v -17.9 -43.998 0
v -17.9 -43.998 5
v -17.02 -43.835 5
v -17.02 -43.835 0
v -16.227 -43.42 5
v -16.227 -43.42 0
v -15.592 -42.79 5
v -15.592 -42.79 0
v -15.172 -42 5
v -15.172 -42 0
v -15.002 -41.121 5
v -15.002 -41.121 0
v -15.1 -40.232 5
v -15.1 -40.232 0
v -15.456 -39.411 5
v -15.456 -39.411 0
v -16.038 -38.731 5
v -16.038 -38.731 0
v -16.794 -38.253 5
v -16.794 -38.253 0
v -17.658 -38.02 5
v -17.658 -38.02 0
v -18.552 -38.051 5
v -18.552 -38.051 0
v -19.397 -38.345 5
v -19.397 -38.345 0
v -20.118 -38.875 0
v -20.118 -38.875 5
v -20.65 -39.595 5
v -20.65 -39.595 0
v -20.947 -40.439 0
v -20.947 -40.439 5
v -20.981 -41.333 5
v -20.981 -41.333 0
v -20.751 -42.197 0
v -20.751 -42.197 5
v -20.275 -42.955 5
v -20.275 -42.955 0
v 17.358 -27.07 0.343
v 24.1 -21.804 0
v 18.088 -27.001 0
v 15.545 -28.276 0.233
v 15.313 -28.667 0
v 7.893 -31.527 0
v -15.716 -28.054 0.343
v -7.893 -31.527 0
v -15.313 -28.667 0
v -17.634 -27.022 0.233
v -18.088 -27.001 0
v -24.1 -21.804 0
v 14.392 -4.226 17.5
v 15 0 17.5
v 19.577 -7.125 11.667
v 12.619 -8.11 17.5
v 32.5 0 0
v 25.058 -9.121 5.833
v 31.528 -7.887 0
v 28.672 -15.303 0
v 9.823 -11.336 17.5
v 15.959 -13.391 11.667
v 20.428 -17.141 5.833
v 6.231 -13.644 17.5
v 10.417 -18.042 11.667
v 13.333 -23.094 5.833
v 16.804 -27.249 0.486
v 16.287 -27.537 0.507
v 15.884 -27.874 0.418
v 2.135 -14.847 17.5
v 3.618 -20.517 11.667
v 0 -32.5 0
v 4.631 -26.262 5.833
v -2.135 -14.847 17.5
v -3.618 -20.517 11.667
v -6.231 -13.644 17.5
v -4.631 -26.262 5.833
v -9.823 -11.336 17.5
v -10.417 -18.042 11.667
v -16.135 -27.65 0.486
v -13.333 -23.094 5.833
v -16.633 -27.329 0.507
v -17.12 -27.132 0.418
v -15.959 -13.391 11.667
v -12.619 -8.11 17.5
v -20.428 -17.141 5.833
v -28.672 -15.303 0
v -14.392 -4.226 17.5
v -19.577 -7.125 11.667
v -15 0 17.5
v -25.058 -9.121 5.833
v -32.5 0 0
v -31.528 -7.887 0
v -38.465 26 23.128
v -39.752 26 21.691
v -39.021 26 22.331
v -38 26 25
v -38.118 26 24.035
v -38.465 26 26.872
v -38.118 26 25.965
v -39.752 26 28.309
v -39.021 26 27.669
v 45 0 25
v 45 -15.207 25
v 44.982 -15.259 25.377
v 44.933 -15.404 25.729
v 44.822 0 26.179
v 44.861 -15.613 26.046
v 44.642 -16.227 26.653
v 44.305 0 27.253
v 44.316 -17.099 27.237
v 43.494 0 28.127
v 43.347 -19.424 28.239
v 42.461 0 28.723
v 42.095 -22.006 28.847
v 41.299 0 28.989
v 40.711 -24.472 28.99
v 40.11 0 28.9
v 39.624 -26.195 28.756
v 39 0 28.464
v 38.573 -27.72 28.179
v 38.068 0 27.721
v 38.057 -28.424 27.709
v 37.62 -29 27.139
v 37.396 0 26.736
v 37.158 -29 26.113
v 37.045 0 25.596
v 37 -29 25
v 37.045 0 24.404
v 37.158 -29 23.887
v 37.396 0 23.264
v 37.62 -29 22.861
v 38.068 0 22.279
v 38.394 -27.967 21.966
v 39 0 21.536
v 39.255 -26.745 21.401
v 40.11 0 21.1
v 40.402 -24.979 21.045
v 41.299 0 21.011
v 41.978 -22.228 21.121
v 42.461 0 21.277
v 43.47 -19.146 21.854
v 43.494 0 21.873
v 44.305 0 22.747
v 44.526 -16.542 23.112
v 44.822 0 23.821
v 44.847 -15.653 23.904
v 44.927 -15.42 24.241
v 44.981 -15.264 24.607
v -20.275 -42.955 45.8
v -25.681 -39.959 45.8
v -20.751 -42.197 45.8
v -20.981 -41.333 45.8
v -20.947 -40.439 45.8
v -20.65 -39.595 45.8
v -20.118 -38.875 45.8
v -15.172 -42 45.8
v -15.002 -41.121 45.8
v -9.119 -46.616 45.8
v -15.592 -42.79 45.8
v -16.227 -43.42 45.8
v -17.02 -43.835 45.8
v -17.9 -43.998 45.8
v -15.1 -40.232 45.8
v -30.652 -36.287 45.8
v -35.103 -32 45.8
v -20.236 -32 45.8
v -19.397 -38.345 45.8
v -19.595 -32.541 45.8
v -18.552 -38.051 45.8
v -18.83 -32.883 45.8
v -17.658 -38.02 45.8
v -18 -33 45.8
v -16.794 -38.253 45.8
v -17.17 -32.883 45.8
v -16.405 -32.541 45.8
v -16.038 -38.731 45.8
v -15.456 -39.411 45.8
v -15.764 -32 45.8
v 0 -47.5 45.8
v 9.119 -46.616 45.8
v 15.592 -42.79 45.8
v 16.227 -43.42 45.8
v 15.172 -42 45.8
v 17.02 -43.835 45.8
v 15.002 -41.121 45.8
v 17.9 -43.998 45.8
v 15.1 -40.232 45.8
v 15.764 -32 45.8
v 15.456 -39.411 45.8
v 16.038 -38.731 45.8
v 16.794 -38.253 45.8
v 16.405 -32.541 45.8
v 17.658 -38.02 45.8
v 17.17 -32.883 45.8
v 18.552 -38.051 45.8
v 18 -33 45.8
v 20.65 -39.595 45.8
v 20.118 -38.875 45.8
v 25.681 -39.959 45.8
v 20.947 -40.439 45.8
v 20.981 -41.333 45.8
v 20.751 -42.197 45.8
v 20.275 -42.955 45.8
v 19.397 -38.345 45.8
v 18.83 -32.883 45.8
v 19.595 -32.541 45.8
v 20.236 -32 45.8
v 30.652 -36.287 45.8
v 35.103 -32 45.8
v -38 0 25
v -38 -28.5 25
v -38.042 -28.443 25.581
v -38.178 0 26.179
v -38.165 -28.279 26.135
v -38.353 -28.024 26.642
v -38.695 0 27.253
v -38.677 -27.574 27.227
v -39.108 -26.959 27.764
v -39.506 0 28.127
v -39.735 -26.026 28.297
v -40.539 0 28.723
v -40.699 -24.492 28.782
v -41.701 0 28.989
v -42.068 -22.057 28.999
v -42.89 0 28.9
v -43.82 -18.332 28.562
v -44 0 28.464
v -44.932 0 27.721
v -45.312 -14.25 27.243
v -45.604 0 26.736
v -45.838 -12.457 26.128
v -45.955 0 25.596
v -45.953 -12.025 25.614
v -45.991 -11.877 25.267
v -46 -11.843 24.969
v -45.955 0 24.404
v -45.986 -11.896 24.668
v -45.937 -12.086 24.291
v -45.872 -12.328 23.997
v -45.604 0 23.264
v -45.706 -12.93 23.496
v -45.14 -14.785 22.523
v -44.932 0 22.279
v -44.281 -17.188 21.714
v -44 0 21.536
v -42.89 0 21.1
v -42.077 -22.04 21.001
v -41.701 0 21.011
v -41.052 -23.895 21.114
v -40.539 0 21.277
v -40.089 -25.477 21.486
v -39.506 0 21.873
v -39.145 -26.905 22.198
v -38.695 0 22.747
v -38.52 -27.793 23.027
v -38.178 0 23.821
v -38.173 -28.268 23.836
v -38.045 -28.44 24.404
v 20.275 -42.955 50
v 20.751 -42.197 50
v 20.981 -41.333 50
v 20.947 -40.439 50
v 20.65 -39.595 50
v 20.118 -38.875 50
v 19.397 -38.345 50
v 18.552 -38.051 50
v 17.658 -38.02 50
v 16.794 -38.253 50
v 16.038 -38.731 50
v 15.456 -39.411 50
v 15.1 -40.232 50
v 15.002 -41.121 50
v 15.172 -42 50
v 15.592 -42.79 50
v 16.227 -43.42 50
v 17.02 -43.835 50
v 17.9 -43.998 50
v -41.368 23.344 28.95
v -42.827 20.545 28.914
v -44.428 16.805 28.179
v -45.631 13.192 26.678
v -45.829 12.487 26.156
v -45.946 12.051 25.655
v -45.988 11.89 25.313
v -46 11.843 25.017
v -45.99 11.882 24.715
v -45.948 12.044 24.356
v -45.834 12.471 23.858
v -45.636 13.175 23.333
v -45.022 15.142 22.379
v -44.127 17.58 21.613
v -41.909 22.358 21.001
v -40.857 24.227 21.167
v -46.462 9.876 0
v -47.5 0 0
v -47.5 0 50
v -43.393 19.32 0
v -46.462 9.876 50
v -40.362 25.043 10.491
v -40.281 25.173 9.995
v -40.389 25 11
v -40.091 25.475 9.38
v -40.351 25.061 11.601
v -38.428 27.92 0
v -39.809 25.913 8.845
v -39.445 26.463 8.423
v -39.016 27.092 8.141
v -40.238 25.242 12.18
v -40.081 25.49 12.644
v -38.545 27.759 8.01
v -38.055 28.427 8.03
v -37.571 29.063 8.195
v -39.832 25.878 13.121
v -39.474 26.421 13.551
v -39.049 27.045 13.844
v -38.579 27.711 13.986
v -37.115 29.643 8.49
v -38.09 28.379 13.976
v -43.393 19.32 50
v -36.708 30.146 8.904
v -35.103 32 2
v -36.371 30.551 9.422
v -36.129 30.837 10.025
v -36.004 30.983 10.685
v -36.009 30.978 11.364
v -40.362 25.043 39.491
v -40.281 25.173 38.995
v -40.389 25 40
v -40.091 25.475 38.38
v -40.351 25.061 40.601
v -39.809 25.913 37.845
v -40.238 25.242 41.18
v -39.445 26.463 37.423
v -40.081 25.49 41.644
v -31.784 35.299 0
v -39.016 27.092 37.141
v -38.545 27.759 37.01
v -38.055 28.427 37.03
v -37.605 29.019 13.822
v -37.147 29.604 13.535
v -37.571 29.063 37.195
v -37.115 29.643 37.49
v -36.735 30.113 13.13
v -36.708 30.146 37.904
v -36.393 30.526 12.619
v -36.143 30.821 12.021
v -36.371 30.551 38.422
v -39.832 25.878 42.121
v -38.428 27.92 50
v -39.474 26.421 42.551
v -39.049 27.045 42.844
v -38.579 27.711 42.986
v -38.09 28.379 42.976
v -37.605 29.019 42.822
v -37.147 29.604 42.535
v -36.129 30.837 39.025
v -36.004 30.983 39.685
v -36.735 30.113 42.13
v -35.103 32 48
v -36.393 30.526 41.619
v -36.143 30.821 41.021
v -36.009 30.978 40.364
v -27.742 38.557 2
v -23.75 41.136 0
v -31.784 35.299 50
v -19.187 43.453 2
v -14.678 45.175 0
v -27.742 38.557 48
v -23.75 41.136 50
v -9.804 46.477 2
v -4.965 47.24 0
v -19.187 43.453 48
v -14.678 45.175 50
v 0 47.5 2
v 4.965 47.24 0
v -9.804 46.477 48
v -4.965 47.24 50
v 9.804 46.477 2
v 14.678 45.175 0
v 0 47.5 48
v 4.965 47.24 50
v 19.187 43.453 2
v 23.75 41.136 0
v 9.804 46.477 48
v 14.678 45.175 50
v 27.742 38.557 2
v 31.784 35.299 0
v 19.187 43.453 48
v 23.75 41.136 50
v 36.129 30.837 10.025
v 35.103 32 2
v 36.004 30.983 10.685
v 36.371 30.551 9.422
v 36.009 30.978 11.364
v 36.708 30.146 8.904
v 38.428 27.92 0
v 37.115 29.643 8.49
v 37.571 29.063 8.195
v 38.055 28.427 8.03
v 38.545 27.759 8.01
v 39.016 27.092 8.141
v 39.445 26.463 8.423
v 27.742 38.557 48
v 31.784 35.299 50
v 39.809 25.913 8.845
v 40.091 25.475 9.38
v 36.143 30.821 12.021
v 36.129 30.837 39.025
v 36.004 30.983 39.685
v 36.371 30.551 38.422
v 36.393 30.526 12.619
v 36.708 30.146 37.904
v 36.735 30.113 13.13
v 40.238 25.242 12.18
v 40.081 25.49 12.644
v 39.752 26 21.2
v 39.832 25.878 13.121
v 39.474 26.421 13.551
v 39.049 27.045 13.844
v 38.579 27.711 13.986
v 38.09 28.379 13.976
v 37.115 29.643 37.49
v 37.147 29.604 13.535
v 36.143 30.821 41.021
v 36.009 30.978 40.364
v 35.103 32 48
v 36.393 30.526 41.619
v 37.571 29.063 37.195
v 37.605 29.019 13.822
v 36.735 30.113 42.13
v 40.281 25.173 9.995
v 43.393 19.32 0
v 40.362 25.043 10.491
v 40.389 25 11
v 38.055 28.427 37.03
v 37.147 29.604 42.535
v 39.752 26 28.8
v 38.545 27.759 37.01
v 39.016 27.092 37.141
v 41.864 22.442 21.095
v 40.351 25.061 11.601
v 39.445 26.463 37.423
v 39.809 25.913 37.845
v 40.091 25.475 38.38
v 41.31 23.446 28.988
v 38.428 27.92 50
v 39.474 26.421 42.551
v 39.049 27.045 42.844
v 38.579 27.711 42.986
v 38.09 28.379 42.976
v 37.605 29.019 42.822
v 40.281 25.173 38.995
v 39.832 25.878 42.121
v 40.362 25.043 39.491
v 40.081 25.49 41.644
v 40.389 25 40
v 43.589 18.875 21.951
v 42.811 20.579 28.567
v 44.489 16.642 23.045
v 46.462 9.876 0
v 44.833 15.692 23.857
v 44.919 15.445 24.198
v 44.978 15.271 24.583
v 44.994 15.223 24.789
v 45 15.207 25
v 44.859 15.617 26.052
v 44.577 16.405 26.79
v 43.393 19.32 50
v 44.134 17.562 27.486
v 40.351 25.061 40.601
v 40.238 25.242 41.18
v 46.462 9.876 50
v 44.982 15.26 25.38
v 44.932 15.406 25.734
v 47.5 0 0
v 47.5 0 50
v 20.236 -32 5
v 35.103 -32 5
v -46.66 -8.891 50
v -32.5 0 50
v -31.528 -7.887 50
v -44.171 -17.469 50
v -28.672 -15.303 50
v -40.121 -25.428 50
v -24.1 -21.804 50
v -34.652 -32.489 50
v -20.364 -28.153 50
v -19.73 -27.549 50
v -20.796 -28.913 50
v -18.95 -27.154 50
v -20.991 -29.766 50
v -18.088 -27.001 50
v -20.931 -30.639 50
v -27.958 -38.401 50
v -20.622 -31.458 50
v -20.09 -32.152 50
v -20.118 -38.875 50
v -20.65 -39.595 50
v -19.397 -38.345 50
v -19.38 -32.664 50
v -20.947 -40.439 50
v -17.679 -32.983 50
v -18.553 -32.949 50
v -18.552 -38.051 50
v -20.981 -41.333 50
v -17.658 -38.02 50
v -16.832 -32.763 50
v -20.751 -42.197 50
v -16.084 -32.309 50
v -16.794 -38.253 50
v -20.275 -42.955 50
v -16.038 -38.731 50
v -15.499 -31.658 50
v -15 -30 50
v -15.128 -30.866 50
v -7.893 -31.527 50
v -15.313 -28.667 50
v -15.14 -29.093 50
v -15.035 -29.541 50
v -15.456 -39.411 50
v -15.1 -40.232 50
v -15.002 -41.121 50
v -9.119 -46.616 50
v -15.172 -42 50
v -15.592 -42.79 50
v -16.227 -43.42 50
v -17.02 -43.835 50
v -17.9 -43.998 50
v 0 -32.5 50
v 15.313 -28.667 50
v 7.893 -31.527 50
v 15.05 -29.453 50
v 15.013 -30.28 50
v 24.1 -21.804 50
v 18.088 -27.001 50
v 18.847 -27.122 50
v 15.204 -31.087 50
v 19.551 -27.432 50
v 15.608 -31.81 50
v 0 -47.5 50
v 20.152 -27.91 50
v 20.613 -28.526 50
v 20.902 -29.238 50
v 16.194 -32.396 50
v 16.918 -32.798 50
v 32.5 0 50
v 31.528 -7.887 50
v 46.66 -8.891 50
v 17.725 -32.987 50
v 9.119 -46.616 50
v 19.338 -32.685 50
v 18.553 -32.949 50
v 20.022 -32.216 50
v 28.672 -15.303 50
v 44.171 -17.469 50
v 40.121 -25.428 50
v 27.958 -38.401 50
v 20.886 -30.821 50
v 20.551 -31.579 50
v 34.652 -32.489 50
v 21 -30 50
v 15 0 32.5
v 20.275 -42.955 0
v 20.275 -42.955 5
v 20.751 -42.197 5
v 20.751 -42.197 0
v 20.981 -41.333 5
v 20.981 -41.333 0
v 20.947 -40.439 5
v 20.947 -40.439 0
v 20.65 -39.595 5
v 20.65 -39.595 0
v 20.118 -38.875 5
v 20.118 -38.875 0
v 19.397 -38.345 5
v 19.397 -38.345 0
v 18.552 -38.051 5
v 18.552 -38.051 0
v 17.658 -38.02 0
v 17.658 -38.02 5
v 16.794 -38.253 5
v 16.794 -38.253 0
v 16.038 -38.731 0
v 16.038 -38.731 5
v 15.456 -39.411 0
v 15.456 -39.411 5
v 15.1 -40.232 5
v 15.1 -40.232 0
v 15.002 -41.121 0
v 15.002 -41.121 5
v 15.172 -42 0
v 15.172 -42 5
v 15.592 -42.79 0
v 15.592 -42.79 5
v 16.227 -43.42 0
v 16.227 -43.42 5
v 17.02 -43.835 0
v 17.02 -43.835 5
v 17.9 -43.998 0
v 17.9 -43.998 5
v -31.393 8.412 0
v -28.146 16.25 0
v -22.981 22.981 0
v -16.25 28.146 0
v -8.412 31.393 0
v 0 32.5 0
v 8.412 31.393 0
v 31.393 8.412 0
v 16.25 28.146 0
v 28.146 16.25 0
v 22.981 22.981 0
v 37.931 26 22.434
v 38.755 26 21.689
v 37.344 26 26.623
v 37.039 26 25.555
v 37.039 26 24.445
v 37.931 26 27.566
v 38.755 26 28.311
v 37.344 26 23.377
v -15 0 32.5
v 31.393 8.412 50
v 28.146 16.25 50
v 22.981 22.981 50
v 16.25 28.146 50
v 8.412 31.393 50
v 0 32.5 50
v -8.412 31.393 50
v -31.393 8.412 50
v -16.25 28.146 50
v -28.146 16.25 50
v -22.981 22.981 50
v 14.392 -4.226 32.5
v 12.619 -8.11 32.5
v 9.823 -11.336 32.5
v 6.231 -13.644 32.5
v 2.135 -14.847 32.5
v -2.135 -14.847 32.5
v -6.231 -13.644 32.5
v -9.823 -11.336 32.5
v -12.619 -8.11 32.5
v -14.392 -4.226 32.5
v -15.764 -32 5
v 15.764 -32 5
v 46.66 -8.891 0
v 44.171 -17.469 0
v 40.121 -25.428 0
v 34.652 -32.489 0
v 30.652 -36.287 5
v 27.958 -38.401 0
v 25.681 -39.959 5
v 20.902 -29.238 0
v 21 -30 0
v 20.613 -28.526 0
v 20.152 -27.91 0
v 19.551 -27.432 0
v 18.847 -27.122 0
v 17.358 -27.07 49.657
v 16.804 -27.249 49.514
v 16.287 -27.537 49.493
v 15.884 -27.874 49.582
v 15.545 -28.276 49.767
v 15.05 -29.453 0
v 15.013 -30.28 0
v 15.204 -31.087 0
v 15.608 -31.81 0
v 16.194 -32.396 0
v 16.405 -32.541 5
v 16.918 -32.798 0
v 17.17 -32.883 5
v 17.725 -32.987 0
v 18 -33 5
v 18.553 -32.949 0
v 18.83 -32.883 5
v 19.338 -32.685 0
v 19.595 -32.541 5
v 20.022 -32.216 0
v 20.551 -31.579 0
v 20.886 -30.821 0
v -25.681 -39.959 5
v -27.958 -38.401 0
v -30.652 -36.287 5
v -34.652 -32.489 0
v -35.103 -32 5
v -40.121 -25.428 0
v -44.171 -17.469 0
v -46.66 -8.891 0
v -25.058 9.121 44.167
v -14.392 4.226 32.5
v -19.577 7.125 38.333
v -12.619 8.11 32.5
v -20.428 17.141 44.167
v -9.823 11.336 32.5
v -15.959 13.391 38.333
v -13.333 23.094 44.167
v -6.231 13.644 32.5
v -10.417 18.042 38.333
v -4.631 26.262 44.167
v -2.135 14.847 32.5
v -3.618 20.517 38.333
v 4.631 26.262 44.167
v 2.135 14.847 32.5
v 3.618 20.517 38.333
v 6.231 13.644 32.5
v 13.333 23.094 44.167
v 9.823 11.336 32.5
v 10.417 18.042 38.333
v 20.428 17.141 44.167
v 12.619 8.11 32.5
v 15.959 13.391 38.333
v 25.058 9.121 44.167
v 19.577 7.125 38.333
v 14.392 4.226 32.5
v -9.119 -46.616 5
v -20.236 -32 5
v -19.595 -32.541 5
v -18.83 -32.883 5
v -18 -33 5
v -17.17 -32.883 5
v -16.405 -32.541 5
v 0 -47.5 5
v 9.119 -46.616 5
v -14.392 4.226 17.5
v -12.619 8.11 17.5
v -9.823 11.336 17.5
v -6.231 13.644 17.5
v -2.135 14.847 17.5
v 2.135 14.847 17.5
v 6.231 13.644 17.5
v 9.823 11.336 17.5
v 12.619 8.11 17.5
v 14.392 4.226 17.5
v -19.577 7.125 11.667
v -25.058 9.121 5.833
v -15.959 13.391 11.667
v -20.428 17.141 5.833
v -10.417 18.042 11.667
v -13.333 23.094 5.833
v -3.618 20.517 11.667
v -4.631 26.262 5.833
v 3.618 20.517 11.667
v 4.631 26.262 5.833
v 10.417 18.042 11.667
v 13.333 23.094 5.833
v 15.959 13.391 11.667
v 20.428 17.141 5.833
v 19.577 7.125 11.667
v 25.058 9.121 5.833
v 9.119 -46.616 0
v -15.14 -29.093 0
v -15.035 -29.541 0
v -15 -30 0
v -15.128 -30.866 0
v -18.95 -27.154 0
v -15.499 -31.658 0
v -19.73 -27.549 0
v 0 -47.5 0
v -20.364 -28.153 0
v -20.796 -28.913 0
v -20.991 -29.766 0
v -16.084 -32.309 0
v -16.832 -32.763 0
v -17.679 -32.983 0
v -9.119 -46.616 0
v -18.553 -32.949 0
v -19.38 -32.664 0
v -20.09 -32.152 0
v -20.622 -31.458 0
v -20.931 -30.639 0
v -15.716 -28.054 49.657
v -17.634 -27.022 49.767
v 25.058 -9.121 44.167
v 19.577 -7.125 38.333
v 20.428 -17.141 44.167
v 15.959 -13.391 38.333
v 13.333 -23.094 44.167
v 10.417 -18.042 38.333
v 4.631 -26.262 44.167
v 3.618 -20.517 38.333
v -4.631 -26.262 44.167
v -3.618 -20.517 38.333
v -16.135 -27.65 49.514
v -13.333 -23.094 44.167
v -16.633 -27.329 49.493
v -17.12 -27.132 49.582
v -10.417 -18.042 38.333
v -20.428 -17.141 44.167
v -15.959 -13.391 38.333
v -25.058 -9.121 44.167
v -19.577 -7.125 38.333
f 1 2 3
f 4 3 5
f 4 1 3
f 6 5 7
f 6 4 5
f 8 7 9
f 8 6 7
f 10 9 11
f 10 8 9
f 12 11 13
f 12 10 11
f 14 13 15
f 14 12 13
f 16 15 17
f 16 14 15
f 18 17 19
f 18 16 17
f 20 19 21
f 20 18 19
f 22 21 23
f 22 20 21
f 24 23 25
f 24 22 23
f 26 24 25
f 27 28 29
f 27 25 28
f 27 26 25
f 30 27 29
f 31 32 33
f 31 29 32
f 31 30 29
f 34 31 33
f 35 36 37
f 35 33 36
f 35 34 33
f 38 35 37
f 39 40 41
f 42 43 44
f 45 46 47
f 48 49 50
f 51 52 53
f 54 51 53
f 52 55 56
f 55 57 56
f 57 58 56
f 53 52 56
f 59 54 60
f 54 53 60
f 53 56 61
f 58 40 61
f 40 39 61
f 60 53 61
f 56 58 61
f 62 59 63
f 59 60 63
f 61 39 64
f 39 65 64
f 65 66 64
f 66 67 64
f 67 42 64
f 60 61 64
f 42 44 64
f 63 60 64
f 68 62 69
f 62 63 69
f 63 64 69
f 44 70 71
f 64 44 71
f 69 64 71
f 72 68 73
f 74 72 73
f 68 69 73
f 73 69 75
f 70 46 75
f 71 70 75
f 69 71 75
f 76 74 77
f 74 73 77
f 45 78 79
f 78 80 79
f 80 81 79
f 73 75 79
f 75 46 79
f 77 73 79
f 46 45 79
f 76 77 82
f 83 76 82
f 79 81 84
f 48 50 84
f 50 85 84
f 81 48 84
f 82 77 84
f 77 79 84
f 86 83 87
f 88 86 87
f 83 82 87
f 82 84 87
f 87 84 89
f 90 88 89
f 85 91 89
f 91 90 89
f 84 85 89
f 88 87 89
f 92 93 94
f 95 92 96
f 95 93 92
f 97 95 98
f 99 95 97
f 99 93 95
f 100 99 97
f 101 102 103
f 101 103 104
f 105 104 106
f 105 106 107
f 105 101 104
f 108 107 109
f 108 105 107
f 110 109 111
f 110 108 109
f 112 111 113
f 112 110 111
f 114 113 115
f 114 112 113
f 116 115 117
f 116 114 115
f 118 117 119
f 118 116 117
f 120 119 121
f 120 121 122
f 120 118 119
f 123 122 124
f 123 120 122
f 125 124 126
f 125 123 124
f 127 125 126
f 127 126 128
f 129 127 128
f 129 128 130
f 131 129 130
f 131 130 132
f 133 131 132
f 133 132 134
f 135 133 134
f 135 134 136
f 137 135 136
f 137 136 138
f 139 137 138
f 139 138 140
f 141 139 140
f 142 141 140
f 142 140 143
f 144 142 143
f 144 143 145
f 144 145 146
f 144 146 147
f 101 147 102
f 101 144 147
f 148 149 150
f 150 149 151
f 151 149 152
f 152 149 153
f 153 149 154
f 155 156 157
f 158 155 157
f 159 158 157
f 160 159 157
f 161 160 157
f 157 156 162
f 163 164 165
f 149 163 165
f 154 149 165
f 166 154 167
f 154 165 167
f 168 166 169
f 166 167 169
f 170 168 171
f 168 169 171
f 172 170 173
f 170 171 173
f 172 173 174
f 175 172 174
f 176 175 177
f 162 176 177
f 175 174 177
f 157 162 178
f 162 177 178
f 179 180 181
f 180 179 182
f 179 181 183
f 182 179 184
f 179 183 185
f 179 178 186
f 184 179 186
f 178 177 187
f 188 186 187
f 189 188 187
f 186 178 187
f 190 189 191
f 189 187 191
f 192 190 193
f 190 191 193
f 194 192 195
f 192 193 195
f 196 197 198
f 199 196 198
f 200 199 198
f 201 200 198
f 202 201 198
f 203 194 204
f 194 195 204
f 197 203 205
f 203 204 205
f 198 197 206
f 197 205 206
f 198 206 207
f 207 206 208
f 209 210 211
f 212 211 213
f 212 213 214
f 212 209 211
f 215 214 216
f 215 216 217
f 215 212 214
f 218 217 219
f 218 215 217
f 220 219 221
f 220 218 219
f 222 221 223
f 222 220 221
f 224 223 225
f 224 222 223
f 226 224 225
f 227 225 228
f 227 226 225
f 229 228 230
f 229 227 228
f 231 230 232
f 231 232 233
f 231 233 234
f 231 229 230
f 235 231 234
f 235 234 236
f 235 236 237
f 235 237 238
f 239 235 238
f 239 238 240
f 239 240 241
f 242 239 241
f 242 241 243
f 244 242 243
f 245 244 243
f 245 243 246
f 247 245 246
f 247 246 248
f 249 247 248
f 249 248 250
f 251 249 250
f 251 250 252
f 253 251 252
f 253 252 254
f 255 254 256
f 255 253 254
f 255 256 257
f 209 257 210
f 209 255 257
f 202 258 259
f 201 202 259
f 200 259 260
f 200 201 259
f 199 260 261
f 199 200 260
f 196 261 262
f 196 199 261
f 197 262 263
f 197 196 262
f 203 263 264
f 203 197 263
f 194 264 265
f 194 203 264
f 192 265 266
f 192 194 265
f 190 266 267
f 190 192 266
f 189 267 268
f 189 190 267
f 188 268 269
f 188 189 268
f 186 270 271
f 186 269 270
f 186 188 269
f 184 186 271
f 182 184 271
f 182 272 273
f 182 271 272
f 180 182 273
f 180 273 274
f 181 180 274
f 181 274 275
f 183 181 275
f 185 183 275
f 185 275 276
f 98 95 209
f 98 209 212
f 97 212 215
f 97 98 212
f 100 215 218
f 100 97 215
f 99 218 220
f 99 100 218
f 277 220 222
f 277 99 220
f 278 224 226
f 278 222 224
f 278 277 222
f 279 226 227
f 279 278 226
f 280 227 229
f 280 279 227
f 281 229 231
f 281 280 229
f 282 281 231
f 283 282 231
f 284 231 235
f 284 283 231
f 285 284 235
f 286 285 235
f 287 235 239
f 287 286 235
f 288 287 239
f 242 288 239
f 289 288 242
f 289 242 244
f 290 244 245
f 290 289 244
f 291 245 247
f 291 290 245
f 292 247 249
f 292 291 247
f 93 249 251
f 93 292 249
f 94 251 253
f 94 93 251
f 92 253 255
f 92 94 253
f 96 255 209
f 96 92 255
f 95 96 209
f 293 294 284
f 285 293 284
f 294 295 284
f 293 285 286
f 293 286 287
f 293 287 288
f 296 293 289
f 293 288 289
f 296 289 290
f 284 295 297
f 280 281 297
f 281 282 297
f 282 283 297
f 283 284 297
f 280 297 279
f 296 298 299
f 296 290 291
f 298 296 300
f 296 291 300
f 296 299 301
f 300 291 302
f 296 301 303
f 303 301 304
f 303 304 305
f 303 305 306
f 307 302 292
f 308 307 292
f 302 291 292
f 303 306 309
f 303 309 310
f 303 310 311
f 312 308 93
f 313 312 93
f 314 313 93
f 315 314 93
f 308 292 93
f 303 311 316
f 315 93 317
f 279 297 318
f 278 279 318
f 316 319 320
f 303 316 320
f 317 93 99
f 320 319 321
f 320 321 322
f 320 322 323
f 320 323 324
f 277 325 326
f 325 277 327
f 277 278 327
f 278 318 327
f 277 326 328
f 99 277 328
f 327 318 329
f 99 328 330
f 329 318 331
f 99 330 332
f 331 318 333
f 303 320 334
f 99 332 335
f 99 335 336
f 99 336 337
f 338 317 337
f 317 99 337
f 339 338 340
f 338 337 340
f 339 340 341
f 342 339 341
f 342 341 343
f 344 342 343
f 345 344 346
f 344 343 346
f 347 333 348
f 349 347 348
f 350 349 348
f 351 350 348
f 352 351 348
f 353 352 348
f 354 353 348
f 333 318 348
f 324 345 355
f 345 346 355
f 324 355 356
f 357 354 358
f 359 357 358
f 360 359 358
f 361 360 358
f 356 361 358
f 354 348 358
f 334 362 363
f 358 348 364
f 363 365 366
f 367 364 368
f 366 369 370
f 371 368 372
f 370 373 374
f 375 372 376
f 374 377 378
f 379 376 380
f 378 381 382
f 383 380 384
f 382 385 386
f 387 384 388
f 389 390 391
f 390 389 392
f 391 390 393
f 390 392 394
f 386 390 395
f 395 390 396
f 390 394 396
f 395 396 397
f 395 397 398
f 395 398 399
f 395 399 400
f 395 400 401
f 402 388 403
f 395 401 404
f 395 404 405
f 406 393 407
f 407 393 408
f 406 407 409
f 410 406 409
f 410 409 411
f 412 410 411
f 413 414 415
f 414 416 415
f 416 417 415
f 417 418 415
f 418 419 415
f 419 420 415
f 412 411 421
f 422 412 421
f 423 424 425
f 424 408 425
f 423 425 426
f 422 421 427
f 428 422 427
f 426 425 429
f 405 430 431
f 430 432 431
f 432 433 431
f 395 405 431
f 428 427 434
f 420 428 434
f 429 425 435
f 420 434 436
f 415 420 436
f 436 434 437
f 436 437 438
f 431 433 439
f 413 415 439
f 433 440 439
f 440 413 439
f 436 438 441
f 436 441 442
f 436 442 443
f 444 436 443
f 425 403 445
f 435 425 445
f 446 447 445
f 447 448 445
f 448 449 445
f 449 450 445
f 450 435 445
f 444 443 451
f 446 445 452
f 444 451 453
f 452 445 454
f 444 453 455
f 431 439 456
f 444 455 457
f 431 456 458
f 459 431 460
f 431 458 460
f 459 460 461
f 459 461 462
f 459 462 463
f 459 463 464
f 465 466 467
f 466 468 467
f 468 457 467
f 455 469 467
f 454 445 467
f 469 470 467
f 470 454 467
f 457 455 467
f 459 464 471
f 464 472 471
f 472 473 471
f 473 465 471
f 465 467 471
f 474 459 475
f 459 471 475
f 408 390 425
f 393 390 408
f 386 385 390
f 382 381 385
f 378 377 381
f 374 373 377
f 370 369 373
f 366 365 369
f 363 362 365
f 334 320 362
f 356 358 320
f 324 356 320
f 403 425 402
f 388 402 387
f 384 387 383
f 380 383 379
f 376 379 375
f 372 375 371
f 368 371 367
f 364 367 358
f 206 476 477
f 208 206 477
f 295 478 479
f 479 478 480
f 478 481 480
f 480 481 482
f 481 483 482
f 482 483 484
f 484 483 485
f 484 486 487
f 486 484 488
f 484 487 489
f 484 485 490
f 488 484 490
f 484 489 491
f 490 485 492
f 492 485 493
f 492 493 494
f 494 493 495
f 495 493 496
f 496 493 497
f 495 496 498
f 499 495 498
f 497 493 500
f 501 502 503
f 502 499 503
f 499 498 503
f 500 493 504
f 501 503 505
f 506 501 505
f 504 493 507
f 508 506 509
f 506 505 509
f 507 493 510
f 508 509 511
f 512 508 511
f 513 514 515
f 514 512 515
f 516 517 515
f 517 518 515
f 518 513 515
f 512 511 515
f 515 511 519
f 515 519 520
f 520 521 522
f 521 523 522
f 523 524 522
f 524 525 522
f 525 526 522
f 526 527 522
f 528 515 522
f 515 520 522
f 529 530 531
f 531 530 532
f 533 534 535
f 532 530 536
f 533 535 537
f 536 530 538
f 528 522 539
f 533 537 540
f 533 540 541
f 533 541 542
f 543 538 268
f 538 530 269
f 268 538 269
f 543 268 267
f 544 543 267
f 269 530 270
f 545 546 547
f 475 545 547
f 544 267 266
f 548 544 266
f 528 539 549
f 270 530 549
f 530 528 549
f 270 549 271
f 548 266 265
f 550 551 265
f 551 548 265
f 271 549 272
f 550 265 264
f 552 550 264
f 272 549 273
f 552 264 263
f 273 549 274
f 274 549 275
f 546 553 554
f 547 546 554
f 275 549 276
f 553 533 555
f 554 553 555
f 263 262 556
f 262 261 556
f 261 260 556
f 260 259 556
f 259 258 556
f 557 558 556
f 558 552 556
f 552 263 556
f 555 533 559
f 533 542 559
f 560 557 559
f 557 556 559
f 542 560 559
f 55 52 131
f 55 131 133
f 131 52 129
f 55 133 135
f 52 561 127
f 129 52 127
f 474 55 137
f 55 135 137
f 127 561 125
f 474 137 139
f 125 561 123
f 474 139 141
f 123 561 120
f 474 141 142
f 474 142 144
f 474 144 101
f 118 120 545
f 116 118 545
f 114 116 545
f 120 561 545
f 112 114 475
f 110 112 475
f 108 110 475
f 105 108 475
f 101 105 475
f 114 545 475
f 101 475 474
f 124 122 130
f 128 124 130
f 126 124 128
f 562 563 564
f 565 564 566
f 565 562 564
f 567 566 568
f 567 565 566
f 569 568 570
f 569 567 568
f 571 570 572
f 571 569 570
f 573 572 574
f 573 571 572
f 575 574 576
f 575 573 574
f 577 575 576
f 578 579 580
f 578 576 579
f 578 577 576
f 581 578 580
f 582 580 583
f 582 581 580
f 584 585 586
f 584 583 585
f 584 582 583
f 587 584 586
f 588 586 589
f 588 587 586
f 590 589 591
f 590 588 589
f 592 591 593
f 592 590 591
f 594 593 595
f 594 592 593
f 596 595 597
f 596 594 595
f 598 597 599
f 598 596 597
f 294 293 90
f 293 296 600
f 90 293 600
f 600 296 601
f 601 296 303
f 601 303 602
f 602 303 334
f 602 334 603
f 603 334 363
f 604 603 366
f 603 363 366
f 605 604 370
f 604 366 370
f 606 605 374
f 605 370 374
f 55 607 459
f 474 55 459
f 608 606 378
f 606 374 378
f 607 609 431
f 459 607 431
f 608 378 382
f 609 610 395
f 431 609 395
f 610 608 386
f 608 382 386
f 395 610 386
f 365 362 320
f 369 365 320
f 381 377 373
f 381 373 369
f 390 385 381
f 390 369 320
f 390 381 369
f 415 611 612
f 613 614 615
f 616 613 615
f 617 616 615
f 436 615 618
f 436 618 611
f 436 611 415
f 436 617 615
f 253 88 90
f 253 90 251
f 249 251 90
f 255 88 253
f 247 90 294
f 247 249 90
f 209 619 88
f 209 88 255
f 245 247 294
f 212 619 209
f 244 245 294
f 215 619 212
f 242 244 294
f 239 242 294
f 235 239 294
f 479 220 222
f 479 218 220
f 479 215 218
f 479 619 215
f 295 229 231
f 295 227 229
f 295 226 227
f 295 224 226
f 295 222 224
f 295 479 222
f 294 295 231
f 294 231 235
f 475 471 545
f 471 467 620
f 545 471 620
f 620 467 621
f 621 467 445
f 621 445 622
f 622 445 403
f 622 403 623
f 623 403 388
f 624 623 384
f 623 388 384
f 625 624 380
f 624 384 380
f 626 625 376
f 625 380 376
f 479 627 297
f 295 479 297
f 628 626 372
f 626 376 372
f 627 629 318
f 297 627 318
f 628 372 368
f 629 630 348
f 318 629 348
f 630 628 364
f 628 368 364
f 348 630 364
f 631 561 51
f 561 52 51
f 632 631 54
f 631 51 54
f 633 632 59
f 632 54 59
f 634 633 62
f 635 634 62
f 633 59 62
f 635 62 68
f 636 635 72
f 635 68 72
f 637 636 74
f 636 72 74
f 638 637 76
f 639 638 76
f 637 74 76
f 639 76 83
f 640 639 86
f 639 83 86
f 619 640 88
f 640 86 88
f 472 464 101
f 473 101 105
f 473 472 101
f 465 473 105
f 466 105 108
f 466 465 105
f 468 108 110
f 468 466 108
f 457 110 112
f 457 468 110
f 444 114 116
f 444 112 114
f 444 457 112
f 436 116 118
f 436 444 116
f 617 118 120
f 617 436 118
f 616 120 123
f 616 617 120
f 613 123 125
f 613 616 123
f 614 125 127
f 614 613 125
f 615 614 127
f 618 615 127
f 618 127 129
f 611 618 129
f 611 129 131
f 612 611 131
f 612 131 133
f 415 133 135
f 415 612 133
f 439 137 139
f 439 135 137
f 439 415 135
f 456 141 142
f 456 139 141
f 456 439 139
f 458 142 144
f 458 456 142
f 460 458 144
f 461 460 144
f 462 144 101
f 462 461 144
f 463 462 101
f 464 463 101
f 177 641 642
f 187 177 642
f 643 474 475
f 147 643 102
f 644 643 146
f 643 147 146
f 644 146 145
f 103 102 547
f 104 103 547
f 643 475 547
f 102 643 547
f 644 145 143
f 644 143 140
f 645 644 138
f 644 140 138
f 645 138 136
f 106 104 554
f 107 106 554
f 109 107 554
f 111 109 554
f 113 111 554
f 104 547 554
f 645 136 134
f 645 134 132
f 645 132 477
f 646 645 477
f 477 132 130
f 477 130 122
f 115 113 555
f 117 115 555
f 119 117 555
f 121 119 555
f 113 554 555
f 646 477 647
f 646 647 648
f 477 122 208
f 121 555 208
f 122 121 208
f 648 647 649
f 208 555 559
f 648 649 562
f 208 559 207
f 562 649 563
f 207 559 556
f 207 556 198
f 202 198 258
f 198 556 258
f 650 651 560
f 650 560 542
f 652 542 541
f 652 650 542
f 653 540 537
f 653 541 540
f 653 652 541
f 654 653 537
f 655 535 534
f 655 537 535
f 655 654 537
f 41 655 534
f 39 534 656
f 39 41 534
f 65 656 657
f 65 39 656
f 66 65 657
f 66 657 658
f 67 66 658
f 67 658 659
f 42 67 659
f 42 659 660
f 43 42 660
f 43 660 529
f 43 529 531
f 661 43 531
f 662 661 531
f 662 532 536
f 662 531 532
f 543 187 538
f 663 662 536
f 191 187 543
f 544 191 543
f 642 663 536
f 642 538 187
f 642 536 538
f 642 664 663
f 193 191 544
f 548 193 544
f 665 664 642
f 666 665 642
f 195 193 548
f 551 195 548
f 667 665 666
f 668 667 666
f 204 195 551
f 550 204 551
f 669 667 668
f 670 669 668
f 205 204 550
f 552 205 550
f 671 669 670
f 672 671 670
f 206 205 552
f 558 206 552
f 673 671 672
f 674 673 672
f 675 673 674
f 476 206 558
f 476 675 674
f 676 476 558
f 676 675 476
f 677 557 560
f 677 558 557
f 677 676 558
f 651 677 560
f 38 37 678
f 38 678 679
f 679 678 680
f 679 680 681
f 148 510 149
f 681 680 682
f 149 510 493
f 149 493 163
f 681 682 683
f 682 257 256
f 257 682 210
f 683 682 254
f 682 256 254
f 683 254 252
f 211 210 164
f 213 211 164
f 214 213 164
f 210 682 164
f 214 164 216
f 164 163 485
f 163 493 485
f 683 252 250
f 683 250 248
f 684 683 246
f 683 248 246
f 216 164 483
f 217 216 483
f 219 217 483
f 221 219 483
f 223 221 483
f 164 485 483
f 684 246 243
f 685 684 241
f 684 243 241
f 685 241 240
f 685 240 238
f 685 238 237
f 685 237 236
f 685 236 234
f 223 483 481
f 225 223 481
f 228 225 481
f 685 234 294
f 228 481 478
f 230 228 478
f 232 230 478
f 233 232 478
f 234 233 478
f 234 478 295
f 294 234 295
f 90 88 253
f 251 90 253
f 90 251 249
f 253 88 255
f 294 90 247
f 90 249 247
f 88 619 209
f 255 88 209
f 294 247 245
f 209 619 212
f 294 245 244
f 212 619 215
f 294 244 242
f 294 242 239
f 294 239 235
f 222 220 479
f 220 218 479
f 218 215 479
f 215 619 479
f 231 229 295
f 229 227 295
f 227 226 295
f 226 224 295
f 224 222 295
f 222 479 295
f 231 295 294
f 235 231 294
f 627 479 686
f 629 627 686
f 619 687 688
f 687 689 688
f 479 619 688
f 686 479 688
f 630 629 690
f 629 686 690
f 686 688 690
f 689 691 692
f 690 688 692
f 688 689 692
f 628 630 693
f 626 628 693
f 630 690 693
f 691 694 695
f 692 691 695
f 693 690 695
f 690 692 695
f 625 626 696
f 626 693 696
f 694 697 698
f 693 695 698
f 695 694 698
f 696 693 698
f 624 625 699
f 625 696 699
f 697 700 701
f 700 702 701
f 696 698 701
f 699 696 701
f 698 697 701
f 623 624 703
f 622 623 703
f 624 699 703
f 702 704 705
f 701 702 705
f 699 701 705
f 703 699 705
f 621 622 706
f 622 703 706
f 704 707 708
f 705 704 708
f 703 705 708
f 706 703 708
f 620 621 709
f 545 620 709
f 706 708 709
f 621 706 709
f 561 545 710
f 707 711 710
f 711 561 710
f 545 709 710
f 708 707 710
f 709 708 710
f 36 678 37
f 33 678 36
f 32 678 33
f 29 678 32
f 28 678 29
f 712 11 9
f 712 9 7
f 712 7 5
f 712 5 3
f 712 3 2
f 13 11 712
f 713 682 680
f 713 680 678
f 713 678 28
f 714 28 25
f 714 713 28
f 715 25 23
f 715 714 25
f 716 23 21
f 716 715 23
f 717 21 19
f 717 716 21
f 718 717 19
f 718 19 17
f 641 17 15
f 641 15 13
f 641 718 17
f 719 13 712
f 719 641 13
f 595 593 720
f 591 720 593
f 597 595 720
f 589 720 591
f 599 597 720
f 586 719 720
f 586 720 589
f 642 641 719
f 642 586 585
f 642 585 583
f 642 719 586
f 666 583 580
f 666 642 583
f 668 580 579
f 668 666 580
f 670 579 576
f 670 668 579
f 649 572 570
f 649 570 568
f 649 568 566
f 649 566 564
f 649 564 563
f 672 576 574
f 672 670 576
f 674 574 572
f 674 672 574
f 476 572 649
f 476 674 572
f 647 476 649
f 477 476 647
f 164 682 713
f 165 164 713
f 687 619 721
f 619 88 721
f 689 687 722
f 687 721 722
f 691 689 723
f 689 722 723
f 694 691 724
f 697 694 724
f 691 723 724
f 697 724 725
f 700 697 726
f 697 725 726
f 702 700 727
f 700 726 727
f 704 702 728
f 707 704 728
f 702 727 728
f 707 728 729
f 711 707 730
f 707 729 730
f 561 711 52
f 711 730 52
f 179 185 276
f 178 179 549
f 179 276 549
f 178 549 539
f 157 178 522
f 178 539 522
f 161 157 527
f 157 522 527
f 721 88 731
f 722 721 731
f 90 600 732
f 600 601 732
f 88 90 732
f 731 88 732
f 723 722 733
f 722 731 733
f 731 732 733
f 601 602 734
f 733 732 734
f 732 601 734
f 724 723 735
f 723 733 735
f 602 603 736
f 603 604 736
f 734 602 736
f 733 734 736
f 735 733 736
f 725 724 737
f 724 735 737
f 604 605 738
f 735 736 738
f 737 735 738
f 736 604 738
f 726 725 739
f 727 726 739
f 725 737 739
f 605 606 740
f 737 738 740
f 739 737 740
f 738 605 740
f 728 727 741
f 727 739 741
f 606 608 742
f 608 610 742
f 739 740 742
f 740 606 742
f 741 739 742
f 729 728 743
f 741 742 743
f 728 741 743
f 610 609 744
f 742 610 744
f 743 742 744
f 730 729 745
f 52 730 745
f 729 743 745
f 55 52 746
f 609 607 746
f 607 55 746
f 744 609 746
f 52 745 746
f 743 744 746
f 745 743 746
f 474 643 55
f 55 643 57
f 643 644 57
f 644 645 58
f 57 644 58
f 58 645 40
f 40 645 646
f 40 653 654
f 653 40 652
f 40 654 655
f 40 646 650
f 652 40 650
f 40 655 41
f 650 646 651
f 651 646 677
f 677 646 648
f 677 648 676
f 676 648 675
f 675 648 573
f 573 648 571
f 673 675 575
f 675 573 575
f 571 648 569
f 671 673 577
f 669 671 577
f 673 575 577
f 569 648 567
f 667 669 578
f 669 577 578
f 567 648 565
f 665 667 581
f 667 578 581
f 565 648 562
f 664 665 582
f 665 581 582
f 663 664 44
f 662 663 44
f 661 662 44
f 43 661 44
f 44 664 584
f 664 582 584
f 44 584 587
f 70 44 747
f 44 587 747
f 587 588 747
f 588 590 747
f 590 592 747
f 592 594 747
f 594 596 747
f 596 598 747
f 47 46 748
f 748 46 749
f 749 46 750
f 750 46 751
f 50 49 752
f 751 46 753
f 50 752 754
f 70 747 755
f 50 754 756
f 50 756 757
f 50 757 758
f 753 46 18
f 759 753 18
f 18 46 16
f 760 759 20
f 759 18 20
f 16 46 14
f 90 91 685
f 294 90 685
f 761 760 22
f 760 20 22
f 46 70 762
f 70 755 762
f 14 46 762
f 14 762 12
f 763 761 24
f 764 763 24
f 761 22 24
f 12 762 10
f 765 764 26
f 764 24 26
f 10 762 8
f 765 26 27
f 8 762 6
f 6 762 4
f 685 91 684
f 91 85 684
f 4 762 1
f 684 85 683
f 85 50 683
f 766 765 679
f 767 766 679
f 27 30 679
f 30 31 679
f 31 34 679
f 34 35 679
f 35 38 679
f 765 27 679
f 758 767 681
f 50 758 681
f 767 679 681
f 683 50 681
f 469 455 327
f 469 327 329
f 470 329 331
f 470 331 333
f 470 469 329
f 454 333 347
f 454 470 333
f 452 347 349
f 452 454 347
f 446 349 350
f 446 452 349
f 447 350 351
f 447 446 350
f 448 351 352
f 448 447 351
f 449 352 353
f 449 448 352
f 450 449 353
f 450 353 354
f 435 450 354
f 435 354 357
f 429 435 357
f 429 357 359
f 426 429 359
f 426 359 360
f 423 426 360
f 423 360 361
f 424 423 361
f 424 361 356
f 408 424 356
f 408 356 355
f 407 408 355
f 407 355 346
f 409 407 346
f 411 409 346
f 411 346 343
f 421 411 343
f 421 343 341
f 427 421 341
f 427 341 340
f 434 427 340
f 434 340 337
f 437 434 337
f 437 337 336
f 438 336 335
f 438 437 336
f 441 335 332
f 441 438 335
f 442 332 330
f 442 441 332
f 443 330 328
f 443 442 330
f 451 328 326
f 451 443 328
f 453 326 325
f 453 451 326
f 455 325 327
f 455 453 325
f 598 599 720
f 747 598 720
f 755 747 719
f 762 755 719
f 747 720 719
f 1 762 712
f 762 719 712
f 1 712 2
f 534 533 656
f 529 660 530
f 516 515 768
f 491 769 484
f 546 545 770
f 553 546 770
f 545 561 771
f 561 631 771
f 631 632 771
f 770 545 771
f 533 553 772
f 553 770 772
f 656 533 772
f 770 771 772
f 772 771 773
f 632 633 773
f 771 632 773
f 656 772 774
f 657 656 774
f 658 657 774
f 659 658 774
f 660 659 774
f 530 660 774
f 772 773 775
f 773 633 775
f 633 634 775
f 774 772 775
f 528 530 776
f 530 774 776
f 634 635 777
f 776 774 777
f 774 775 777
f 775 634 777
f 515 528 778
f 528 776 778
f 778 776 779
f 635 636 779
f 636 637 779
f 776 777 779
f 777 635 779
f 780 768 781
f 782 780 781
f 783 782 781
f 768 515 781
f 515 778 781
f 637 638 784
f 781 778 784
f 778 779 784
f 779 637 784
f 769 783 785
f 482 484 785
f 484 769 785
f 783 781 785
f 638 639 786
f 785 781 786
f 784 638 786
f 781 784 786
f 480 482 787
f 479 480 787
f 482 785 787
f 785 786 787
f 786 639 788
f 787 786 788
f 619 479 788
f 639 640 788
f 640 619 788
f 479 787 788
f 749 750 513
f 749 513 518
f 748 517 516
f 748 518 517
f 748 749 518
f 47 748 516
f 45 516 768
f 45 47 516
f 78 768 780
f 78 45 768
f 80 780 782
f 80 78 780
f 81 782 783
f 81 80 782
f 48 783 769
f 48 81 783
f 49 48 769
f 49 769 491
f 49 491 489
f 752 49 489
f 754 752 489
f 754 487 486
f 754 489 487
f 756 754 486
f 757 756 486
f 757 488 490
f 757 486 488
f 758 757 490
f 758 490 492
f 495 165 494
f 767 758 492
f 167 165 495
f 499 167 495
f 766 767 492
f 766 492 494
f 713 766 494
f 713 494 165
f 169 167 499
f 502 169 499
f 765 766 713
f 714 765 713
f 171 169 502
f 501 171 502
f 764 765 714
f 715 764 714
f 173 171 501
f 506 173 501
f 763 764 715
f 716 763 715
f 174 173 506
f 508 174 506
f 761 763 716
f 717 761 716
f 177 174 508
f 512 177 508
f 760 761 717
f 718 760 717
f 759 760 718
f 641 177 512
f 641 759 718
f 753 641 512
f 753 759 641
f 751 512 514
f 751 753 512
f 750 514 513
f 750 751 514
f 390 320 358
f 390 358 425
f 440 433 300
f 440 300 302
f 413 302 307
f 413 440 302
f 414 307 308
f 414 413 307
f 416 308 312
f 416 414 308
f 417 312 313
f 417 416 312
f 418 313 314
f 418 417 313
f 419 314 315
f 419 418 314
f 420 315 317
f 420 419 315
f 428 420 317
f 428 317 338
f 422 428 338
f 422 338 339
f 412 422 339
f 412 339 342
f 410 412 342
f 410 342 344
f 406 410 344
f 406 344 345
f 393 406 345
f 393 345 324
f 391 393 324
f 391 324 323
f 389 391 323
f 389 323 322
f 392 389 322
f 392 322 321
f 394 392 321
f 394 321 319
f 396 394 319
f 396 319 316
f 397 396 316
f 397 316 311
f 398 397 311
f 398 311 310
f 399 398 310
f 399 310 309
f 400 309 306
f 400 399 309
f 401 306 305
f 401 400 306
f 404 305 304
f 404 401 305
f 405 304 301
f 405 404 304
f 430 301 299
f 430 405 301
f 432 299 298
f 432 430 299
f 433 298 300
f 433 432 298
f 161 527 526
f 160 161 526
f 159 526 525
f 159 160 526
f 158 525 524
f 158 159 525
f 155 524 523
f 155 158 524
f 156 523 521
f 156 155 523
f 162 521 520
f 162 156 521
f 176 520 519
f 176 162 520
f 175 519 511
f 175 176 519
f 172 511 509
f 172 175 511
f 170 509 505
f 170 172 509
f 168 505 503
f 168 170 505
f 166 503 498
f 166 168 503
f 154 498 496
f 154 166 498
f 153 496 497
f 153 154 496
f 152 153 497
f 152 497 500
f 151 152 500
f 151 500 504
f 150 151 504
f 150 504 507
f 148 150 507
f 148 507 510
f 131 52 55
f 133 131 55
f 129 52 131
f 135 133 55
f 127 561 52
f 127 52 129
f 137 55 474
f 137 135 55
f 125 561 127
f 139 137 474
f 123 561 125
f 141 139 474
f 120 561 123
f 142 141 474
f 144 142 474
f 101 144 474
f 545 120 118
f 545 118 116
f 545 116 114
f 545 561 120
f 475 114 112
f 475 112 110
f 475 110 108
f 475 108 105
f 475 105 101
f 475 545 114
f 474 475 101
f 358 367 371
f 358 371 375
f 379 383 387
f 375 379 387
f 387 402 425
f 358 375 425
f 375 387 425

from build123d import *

# Parameters (mm, degrees)
CYLINDER002_R          = 4
CYLINDER002_DEPTH      = 55
CYLINDER002_ROLL_ANGLE = 90
CYLINDER005_R          = 4
CYLINDER005_DEPTH      = 55
CYLINDER005_ROLL_ANGLE = 90
CYLINDER003_R          = 3
CYLINDER003_DEPTH      = 100
CYLINDER004_R          = 3
CYLINDER004_DEPTH      = 100
BOX001_W               = 73
BOX001_H               = 40
BOX001_DEPTH           = 46
REVOLUTION_ANGLE       = -180
CLONE_PLACEMENT_ANGLE  = 180
CYLINDER001_R          = 3
CYLINDER001_DEPTH      = 60
CYLINDER_R             = 3
CYLINDER_DEPTH         = 60
BOX_W                  = 73
BOX_H                  = 40
BOX_DEPTH              = 40.8


with BuildPart() as cilindro002:
    # Cylinder002 → Cylinder002 (new body)
    with BuildSketch(Plane.XY):
        Circle(CYLINDER002_R)
    extrude(amount=CYLINDER002_DEPTH)


with BuildPart() as cilindro002_1:
    # Cylinder002 roll: moved
    add(cilindro002.part.rotate(Axis((0, 0, 0), (1, 0, 0)), CYLINDER002_ROLL_ANGLE))


with BuildPart() as cilindro002_2:
    # Cylinder002 placement: moved
    add(cilindro002_1.part.moved(Location((41, 26, 25))))


with BuildPart() as fusion004:
    # Cylinder005 → Cylinder005 (new body)
    with BuildSketch(Plane.XY):
        Circle(CYLINDER005_R)
    extrude(amount=CYLINDER005_DEPTH)


with BuildPart() as fusion004_1:
    # Cylinder005 roll: moved
    add(fusion004.part.rotate(Axis((0, 0, 0), (1, 0, 0)), CYLINDER005_ROLL_ANGLE))


with BuildPart() as fusion004_2:
    # Cylinder005 placement: moved
    add(fusion004_1.part.moved(Location((-42, 26, 25))))

    # Fusion004: union Cilindro002
    add(cilindro002_2.part)


with BuildPart() as cilindro003:
    # Cylinder003 → Cylinder003 (new body)
    with BuildSketch(Plane(origin=(47, 28, 40), x_dir=(0, -1, 0), z_dir=(-1, 0, 0))):
        Circle(CYLINDER003_R)
    extrude(amount=CYLINDER003_DEPTH)


with BuildPart() as fusion003:
    # Cylinder004 → Cylinder004 (new body)
    with BuildSketch(Plane(origin=(47, 28, 11), x_dir=(0, -1, 0), z_dir=(-1, 0, 0))):
        Circle(CYLINDER004_R)
    extrude(amount=CYLINDER004_DEPTH)

    # Fusion003: union Cilindro003
    add(cilindro003.part)


with BuildPart() as cubo001:
    # Box001 → Box001 (new body)
    with BuildSketch(Plane(origin=(-36, 32, 2), x_dir=(1, 0, 0), z_dir=(0, 0, 1))):
        with Locations((36.5, 20)):
            Rectangle(BOX001_W, BOX001_H)
    extrude(amount=BOX001_DEPTH)


with BuildPart() as revolution:
    # Sketch → Revolution (revolve)
    with BuildSketch(Plane.XZ):
        Polygon((32.5, 50), (15, 32.5), (15, 17.5), (32.5, 0), (47.5, 0), (47.5, 50), align=None)
    revolve(axis=Axis((0, 0, 0), (0, 0, 1)), revolution_arc=REVOLUTION_ANGLE)


with BuildPart() as cut004:
    # Clone base: copy of Revolution
    add(revolution.part)


with BuildPart() as cut004_1:
    # Clone placement: moved
    add(cut004.part.rotate(Axis((0, 0, 0), (0, 0, 1)), CLONE_PLACEMENT_ANGLE))

    # Cut002: cut Cubo001
    add(cubo001.part, mode=Mode.SUBTRACT)

    # Cut003: cut Fusion003
    add(fusion003.part, mode=Mode.SUBTRACT)

    # Cut004: cut Fusion004
    add(fusion004_2.part, mode=Mode.SUBTRACT)


with BuildPart() as cilindro001:
    # Cylinder001 → Cylinder001 (new body)
    with BuildSketch(Plane(origin=(18, -28, -5), x_dir=(1, 0, 0), z_dir=(0, 0, 1))):
        Circle(CYLINDER001_R)
    extrude(amount=CYLINDER001_DEPTH)


with BuildPart() as cilindro:
    # Cylinder → Cylinder (new body)
    with BuildSketch(Plane(origin=(18, -39, -5), x_dir=(1, 0, 0), z_dir=(0, 0, 1))):
        Circle(CYLINDER_R)
    extrude(amount=CYLINDER_DEPTH)


with BuildPart() as fusion:
    # Fusion base: copy of Cilindro
    add(cilindro.part)

    # Fusion: union Cilindro001
    add(cilindro001.part)


with BuildPart() as fusion_1:
    # Fusion placement: moved
    add(fusion.part.moved(Location((-36, 0, 0))))


with BuildPart() as fusion002:
    # Fusion001 base: copy of Cilindro
    add(cilindro.part)

    # Fusion001: union Cilindro001
    add(cilindro001.part)

    # Fusion002: union Fusion
    add(fusion_1.part)


with BuildPart() as fusion002_1:
    # Fusion002 placement: moved
    add(fusion002.part.moved(Location((0, -2, 0))))


with BuildPart() as cubo:
    # Box → Box (new body)
    with BuildSketch(Plane(origin=(-36, -72, 5), x_dir=(1, 0, 0), z_dir=(0, 0, 1))):
        with Locations((36.5, 20)):
            Rectangle(BOX_W, BOX_H)
    extrude(amount=BOX_DEPTH)


with BuildPart() as cut005:
    # Cut base: copy of Revolution
    add(revolution.part)

    # Cut: cut Cubo
    add(cubo.part, mode=Mode.SUBTRACT)

    # Cut001: cut Fusion002
    add(fusion002_1.part, mode=Mode.SUBTRACT)

    # Cut005: cut Fusion004
    add(fusion004_2.part, mode=Mode.SUBTRACT)


solid = Compound([cut004_1.part, cut005.part])
